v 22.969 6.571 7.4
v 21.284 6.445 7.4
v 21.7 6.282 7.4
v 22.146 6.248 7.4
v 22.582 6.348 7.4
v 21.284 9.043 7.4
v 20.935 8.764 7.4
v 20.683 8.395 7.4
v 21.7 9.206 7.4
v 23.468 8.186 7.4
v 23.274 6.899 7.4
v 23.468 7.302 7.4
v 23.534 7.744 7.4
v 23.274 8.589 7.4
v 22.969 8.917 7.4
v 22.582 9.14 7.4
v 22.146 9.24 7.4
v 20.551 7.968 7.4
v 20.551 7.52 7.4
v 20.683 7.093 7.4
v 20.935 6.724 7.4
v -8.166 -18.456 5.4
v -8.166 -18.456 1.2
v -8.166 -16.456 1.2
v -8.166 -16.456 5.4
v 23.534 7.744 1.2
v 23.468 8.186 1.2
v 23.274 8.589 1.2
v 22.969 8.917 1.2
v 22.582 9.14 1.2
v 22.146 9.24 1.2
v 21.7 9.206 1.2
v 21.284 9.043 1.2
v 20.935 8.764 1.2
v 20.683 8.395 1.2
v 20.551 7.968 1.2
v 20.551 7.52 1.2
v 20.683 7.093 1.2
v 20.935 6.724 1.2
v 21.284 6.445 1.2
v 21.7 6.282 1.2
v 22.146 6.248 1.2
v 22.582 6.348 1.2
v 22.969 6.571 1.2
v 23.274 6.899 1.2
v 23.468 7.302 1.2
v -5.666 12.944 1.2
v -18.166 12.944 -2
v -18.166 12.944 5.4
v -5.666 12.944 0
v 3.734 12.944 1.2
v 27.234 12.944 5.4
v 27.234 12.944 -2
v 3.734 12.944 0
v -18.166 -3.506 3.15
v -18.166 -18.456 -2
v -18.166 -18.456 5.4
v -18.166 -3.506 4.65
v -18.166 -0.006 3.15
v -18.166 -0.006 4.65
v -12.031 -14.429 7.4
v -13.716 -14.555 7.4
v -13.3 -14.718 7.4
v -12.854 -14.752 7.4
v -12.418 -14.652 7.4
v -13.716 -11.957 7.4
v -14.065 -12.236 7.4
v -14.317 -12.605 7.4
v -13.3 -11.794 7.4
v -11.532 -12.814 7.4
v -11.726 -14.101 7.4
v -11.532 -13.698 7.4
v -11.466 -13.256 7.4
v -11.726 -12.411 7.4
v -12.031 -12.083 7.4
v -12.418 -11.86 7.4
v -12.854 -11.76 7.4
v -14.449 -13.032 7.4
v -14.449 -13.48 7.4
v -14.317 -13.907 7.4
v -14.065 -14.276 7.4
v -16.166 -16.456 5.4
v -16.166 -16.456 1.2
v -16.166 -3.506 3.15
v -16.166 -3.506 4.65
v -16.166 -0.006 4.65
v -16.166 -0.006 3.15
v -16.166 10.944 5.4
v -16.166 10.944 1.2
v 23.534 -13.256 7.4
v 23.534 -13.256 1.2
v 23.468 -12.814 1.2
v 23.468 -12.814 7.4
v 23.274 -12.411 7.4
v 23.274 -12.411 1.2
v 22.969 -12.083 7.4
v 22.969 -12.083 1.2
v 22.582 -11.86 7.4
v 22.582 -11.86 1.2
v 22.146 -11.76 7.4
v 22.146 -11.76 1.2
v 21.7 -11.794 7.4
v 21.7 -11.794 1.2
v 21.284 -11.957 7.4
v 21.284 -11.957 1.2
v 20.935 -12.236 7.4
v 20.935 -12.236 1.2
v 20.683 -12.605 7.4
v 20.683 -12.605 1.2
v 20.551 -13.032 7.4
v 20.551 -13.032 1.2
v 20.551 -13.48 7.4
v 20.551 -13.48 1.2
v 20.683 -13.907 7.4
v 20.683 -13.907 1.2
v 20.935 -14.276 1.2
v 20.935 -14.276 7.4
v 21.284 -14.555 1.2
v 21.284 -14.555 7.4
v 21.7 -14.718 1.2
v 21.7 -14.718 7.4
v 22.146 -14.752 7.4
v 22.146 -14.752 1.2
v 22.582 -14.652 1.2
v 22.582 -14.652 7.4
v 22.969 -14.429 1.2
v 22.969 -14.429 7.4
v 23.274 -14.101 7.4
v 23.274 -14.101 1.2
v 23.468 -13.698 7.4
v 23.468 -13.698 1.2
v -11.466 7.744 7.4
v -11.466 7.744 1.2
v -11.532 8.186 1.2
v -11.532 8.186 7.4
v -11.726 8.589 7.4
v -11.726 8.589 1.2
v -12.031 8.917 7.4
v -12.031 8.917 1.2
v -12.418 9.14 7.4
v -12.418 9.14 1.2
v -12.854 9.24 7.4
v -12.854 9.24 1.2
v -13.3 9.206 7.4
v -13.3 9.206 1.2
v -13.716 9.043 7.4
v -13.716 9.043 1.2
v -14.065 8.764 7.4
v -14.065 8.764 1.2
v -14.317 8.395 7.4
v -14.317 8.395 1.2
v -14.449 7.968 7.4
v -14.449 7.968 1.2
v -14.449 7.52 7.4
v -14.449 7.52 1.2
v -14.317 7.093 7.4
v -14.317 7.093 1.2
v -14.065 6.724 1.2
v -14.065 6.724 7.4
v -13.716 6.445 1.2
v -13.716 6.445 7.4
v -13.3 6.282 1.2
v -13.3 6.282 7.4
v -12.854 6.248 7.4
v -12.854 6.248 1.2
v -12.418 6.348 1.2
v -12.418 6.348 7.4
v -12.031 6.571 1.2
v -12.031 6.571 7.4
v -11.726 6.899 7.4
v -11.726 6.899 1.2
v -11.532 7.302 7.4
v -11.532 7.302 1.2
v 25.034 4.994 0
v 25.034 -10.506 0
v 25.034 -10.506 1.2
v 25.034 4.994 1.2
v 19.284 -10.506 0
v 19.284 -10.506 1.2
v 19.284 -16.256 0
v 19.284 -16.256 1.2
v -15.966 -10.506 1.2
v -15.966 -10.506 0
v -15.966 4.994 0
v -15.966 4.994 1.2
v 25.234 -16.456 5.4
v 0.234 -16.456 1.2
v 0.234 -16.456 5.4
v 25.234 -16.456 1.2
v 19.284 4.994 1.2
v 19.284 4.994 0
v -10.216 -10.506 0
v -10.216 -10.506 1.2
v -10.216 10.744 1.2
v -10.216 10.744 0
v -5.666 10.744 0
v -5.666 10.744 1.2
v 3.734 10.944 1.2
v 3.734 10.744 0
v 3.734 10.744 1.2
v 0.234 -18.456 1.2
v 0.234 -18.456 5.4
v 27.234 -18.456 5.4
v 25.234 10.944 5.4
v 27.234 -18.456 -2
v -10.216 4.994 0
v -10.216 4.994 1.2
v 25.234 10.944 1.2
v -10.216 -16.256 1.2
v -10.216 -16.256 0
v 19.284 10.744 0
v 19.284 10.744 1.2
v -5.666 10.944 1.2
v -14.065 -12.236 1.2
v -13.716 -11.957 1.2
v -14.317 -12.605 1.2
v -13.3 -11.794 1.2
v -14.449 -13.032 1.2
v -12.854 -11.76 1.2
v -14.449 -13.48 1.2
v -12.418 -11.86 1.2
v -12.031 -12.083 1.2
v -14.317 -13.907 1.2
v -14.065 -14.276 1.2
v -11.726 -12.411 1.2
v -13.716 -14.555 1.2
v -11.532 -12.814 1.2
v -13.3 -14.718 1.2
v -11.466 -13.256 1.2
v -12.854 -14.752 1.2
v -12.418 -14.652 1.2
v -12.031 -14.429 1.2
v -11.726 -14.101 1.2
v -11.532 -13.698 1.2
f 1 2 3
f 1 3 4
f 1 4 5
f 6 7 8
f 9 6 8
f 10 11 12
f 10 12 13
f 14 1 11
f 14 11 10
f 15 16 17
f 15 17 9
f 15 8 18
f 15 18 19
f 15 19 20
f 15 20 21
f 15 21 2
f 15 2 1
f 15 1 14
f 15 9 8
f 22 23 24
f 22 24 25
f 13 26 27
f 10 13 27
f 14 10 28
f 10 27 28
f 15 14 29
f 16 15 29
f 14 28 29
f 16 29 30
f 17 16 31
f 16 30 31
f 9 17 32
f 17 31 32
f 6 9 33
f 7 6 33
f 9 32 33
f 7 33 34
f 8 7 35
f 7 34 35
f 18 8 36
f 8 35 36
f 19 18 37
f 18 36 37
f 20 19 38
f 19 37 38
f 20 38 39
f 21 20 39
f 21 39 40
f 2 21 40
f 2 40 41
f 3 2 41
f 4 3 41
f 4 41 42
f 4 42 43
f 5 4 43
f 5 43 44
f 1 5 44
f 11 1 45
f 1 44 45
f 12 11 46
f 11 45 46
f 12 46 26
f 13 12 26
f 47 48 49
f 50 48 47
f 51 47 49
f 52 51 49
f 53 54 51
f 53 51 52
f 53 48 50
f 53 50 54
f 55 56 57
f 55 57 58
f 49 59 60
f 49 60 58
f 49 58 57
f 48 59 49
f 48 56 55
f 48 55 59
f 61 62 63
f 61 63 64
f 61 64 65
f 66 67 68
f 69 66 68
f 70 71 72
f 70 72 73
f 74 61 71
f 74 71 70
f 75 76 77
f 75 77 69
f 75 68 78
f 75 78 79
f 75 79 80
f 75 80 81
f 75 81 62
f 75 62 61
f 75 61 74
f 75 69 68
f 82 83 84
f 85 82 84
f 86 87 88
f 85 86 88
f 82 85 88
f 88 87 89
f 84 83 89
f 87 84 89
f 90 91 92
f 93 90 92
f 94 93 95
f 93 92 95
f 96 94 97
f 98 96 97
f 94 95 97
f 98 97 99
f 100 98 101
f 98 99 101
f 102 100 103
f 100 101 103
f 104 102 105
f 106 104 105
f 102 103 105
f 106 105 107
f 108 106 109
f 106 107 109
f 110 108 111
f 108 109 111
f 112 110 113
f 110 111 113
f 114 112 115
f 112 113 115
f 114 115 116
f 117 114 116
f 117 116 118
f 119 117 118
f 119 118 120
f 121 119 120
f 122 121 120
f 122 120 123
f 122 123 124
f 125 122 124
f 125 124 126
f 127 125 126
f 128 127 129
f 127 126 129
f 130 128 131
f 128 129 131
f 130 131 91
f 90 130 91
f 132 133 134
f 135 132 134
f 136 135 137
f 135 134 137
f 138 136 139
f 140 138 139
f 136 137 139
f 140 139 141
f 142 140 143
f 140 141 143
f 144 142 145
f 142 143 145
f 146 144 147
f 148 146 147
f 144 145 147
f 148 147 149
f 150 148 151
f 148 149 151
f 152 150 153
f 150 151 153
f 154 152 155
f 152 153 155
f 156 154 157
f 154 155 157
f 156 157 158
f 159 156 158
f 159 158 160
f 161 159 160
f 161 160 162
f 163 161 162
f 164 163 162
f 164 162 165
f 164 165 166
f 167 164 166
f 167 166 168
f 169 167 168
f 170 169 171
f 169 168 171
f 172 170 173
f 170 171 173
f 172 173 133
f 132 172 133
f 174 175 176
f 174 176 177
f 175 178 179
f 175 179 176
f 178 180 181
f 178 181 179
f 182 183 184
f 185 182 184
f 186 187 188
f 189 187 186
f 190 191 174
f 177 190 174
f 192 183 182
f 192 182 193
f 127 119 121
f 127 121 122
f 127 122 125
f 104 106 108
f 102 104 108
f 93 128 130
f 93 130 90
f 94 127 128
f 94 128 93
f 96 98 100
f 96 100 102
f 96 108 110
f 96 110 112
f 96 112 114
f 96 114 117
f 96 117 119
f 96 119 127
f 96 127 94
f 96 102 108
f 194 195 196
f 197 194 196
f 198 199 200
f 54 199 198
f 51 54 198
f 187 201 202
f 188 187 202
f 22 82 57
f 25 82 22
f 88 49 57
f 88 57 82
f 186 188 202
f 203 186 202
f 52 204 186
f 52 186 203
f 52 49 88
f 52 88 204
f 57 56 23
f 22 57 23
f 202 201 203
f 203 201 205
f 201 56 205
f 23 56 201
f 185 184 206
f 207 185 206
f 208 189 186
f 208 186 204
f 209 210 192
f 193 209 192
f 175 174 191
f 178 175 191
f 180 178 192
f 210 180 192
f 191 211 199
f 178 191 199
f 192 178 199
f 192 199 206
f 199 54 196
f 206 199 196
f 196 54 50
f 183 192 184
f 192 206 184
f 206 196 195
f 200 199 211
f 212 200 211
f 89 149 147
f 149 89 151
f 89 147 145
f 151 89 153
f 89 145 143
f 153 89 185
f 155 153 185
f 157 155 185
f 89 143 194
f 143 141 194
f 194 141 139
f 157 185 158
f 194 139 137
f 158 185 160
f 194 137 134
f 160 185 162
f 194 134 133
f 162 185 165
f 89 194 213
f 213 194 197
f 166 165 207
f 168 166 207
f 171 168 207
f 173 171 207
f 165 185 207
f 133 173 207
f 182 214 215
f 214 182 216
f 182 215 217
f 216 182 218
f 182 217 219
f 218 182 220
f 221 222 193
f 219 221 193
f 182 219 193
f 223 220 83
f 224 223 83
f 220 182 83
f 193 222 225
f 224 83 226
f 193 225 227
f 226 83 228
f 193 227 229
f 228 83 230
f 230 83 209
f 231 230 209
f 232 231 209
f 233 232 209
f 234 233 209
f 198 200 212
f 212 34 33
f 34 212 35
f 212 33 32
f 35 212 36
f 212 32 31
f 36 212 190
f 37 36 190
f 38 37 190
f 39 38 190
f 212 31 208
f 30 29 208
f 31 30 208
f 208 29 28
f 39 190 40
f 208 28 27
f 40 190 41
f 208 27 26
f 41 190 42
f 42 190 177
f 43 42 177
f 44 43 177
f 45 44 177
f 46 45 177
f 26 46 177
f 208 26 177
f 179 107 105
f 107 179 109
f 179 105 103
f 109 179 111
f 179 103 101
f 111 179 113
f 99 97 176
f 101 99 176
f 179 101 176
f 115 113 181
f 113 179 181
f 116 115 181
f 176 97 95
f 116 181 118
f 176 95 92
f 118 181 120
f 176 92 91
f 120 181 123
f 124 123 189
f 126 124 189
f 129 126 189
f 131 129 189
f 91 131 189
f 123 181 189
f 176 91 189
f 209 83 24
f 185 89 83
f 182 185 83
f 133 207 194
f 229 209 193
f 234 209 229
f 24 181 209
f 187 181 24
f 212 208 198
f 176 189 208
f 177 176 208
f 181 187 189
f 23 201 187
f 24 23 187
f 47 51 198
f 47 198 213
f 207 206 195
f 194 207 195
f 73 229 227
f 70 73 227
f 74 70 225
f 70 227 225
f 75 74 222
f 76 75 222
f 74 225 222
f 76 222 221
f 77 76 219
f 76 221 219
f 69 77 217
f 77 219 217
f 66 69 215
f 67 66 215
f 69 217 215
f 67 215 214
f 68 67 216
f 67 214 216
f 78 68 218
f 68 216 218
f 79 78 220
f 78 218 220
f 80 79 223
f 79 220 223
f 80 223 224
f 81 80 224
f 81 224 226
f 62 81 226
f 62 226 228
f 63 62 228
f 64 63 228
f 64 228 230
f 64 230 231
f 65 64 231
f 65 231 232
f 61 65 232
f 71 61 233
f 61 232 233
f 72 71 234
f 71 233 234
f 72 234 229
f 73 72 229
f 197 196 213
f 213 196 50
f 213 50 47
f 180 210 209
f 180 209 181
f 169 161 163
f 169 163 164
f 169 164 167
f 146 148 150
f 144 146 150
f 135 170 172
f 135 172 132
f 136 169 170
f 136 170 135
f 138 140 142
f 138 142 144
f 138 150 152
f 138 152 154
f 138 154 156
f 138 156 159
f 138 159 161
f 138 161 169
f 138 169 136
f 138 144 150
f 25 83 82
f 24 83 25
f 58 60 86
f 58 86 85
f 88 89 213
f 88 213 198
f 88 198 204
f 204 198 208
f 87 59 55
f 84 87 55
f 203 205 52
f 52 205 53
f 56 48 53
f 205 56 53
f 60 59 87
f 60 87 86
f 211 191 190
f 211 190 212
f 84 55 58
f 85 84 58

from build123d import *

# Parameters (mm, degrees)
F2_W      = 45.4
F2_H      = 31.4
F2_W_2    = 5.75
F2_H_2    = 5.75
F2_R      = 1.75
F2_W_3    = 29.5
F2_H_3    = 0.2
F2_W_4    = 0.2
F2_H_4    = 15.5
F3_DEPTH  = 1.2
F4_DEPTH  = 2
F5_W      = 45.4
F5_H      = 31.4
F5_W_2    = 41.4
F5_H_2    = 27.4
F6_DEPTH  = 4.2
F5_R      = 1.5
F7_DEPTH  = 6.2
F8_W      = 3.5
F8_H      = 1.5
F9_DEPTH  = 2
F10_W     = 8.4
F10_H     = 4.2
F11_DEPTH = 2
F12_W     = 9.4
F12_H     = 1.2
F13_DEPTH = 2.2


with BuildPart() as f3:
    # F2 (on Top) → F3 (new body)
    with BuildSketch(Plane.XY):
        with Locations((4.5342570215, -2.7560327426)):
            Rectangle(F2_W, F2_H)
        Polygon((-16.1657429785, 10.9439672574), (-10.2157429785, 10.9439672574), (19.2842570215, 10.9439672574), (25.2342570215, 10.9439672574), (25.2342570215, 4.9939672574), (25.2342570215, -10.5060327426), (25.2342570215, -16.4560327426), (19.2842570215, -16.4560327426), (-10.2157429785, -16.4560327426), (-16.1657429785, -16.4560327426), (-16.1657429785, -10.5060327426), (-16.1657429785, 4.9939672574), align=None, mode=Mode.SUBTRACT)
        with Locations((22.1592570215, 7.8689672574)):
            Rectangle(F2_W_2, F2_H_2)
        with Locations((22.0342570215, 7.7439672574)):
            Circle(F2_R, mode=Mode.SUBTRACT)
        with Locations((-13.0907429785, 7.8689672574)):
            Rectangle(F2_W_2, F2_H_2)
        with Locations((-12.9657429785, 7.7439672574)):
            Circle(F2_R, mode=Mode.SUBTRACT)
        with Locations((22.1592570215, -13.3810327426)):
            Rectangle(F2_W_2, F2_H_2)
        with Locations((22.0342570215, -13.2560327426)):
            Circle(F2_R, mode=Mode.SUBTRACT)
        with Locations((-13.0907429785, -13.3810327426)):
            Rectangle(F2_W_2, F2_H_2)
        with Locations((-12.9657429785, -13.2560327426)):
            Circle(F2_R, mode=Mode.SUBTRACT)
        with Locations((-12.9657429785, 7.7439672574)):
            Circle(F2_R)
        with Locations((22.0342570215, 7.7439672574)):
            Circle(F2_R)
        with Locations((22.0342570215, -13.2560327426)):
            Circle(F2_R)
        with Locations((-12.9657429785, -13.2560327426)):
            Circle(F2_R)
        with Locations((4.5342570215, -16.3560327426)):
            Rectangle(F2_W_3, F2_H_3)
        with Locations((4.5342570215, 10.8439672574)):
            Rectangle(F2_W_3, F2_H_3)
        with Locations((-16.0657429785, -2.7560327426)):
            Rectangle(F2_W_4, F2_H_4)
        with Locations((25.1342570215, -2.7560327426)):
            Rectangle(F2_W_4, F2_H_4)
        Polygon((-15.9657429785, -16.2560327426), (-15.9657429785, -10.5060327426), (-16.1657429785, -10.5060327426), (-16.1657429785, -16.4560327426), (-10.2157429785, -16.4560327426), (-10.2157429785, -16.2560327426), align=None)
        Polygon((-15.9657429785, 4.9939672574), (-15.9657429785, 10.7439672574), (-10.2157429785, 10.7439672574), (-10.2157429785, 10.9439672574), (-16.1657429785, 10.9439672574), (-16.1657429785, 4.9939672574), align=None)
        Polygon((25.2342570215, -10.5060327426), (25.0342570215, -10.5060327426), (25.0342570215, -16.2560327426), (19.2842570215, -16.2560327426), (19.2842570215, -16.4560327426), (25.2342570215, -16.4560327426), align=None)
        Polygon((19.2842570215, 10.9439672574), (19.2842570215, 10.7439672574), (25.0342570215, 10.7439672574), (25.0342570215, 4.9939672574), (25.2342570215, 4.9939672574), (25.2342570215, 10.9439672574), align=None)
    extrude(amount=F3_DEPTH)

    # F2 (on Top) → F4 (join)
    with BuildSketch(Plane.XY):
        with Locations((4.5342570215, -2.7560327426)):
            Rectangle(F2_W, F2_H)
        Polygon((-16.1657429785, 10.9439672574), (-10.2157429785, 10.9439672574), (19.2842570215, 10.9439672574), (25.2342570215, 10.9439672574), (25.2342570215, 4.9939672574), (25.2342570215, -10.5060327426), (25.2342570215, -16.4560327426), (19.2842570215, -16.4560327426), (-10.2157429785, -16.4560327426), (-16.1657429785, -16.4560327426), (-16.1657429785, -10.5060327426), (-16.1657429785, 4.9939672574), align=None, mode=Mode.SUBTRACT)
        Polygon((19.2842570215, 10.7439672574), (-10.2157429785, 10.7439672574), (-10.2157429785, 4.9939672574), (-15.9657429785, 4.9939672574), (-15.9657429785, -10.5060327426), (-10.2157429785, -10.5060327426), (-10.2157429785, -16.2560327426), (19.2842570215, -16.2560327426), (19.2842570215, -10.5060327426), (25.0342570215, -10.5060327426), (25.0342570215, 4.9939672574), (19.2842570215, 4.9939672574), align=None)
        with Locations((-13.0907429785, 7.8689672574)):
            Rectangle(F2_W_2, F2_H_2)
        with Locations((-12.9657429785, 7.7439672574)):
            Circle(F2_R, mode=Mode.SUBTRACT)
        with Locations((-13.0907429785, -13.3810327426)):
            Rectangle(F2_W_2, F2_H_2)
        with Locations((-12.9657429785, -13.2560327426)):
            Circle(F2_R, mode=Mode.SUBTRACT)
        with Locations((22.1592570215, -13.3810327426)):
            Rectangle(F2_W_2, F2_H_2)
        with Locations((22.0342570215, -13.2560327426)):
            Circle(F2_R, mode=Mode.SUBTRACT)
        with Locations((22.1592570215, 7.8689672574)):
            Rectangle(F2_W_2, F2_H_2)
        with Locations((22.0342570215, 7.7439672574)):
            Circle(F2_R, mode=Mode.SUBTRACT)
        with Locations((-12.9657429785, 7.7439672574)):
            Circle(F2_R)
        with Locations((-12.9657429785, -13.2560327426)):
            Circle(F2_R)
        with Locations((22.0342570215, -13.2560327426)):
            Circle(F2_R)
        with Locations((22.0342570215, 7.7439672574)):
            Circle(F2_R)
        with Locations((4.5342570215, 10.8439672574)):
            Rectangle(F2_W_3, F2_H_3)
        with Locations((4.5342570215, -16.3560327426)):
            Rectangle(F2_W_3, F2_H_3)
        with Locations((-16.0657429785, -2.7560327426)):
            Rectangle(F2_W_4, F2_H_4)
        with Locations((25.1342570215, -2.7560327426)):
            Rectangle(F2_W_4, F2_H_4)
        Polygon((-15.9657429785, 4.9939672574), (-15.9657429785, 10.7439672574), (-10.2157429785, 10.7439672574), (-10.2157429785, 10.9439672574), (-16.1657429785, 10.9439672574), (-16.1657429785, 4.9939672574), align=None)
        Polygon((-15.9657429785, -16.2560327426), (-15.9657429785, -10.5060327426), (-16.1657429785, -10.5060327426), (-16.1657429785, -16.4560327426), (-10.2157429785, -16.4560327426), (-10.2157429785, -16.2560327426), align=None)
        Polygon((25.2342570215, -10.5060327426), (25.0342570215, -10.5060327426), (25.0342570215, -16.2560327426), (19.2842570215, -16.2560327426), (19.2842570215, -16.4560327426), (25.2342570215, -16.4560327426), align=None)
        Polygon((19.2842570215, 10.9439672574), (19.2842570215, 10.7439672574), (25.0342570215, 10.7439672574), (25.0342570215, 4.9939672574), (25.2342570215, 4.9939672574), (25.2342570215, 10.9439672574), align=None)
    extrude(amount=-F4_DEPTH)

    # F5 (on face) → F6 (join)
    with BuildSketch(Plane.XY.offset(1.2)):
        with Locations((4.5342570215, -2.7560327426)):
            Rectangle(F5_W, F5_H)
        with Locations((4.5342570215, -2.7560327426)):
            Rectangle(F5_W_2, F5_H_2, mode=Mode.SUBTRACT)
    extrude(amount=F6_DEPTH)

    # F5 (on face) → F7 (join)
    with BuildSketch(Plane.XY.offset(1.2)):
        with Locations((-12.9657429785, 7.7439672574)):
            Circle(F5_R)
        with Locations((22.0342570215, 7.7439672574)):
            Circle(F5_R)
        with Locations((22.0342570215, -13.2560327426)):
            Circle(F5_R)
        with Locations((-12.9657429785, -13.2560327426)):
            Circle(F5_R)
    extrude(amount=F7_DEPTH)

    # F8 (on face) → F9 (cut, through all)
    with BuildSketch(Plane(origin=(-18.1657429785, 0, 0), x_dir=(0, -1, 0), z_dir=(-1, 0, 0))):
        with Locations((1.7560327426, 3.9)):
            Rectangle(F8_W, F8_H)
    extrude(amount=-F9_DEPTH, mode=Mode.SUBTRACT)

    # F10 (on face) → F11 (cut, through all)
    with BuildSketch(Plane.XZ.offset(18.4560327426)):
        with Locations((-3.9657429785, 3.3)):
            Rectangle(F10_W, F10_H)
    extrude(amount=-F11_DEPTH, mode=Mode.SUBTRACT)

    # F12 (on face) → F13 (cut, through all)
    with BuildSketch(Plane(origin=(0, 12.9439672574, 0), x_dir=(-1, 0, 0), z_dir=(0, 1, 0))):
        with Locations((0.9657429785, 0.6)):
            Rectangle(F12_W, F12_H)
    extrude(amount=-F13_DEPTH, mode=Mode.SUBTRACT)


solid = f3.part
